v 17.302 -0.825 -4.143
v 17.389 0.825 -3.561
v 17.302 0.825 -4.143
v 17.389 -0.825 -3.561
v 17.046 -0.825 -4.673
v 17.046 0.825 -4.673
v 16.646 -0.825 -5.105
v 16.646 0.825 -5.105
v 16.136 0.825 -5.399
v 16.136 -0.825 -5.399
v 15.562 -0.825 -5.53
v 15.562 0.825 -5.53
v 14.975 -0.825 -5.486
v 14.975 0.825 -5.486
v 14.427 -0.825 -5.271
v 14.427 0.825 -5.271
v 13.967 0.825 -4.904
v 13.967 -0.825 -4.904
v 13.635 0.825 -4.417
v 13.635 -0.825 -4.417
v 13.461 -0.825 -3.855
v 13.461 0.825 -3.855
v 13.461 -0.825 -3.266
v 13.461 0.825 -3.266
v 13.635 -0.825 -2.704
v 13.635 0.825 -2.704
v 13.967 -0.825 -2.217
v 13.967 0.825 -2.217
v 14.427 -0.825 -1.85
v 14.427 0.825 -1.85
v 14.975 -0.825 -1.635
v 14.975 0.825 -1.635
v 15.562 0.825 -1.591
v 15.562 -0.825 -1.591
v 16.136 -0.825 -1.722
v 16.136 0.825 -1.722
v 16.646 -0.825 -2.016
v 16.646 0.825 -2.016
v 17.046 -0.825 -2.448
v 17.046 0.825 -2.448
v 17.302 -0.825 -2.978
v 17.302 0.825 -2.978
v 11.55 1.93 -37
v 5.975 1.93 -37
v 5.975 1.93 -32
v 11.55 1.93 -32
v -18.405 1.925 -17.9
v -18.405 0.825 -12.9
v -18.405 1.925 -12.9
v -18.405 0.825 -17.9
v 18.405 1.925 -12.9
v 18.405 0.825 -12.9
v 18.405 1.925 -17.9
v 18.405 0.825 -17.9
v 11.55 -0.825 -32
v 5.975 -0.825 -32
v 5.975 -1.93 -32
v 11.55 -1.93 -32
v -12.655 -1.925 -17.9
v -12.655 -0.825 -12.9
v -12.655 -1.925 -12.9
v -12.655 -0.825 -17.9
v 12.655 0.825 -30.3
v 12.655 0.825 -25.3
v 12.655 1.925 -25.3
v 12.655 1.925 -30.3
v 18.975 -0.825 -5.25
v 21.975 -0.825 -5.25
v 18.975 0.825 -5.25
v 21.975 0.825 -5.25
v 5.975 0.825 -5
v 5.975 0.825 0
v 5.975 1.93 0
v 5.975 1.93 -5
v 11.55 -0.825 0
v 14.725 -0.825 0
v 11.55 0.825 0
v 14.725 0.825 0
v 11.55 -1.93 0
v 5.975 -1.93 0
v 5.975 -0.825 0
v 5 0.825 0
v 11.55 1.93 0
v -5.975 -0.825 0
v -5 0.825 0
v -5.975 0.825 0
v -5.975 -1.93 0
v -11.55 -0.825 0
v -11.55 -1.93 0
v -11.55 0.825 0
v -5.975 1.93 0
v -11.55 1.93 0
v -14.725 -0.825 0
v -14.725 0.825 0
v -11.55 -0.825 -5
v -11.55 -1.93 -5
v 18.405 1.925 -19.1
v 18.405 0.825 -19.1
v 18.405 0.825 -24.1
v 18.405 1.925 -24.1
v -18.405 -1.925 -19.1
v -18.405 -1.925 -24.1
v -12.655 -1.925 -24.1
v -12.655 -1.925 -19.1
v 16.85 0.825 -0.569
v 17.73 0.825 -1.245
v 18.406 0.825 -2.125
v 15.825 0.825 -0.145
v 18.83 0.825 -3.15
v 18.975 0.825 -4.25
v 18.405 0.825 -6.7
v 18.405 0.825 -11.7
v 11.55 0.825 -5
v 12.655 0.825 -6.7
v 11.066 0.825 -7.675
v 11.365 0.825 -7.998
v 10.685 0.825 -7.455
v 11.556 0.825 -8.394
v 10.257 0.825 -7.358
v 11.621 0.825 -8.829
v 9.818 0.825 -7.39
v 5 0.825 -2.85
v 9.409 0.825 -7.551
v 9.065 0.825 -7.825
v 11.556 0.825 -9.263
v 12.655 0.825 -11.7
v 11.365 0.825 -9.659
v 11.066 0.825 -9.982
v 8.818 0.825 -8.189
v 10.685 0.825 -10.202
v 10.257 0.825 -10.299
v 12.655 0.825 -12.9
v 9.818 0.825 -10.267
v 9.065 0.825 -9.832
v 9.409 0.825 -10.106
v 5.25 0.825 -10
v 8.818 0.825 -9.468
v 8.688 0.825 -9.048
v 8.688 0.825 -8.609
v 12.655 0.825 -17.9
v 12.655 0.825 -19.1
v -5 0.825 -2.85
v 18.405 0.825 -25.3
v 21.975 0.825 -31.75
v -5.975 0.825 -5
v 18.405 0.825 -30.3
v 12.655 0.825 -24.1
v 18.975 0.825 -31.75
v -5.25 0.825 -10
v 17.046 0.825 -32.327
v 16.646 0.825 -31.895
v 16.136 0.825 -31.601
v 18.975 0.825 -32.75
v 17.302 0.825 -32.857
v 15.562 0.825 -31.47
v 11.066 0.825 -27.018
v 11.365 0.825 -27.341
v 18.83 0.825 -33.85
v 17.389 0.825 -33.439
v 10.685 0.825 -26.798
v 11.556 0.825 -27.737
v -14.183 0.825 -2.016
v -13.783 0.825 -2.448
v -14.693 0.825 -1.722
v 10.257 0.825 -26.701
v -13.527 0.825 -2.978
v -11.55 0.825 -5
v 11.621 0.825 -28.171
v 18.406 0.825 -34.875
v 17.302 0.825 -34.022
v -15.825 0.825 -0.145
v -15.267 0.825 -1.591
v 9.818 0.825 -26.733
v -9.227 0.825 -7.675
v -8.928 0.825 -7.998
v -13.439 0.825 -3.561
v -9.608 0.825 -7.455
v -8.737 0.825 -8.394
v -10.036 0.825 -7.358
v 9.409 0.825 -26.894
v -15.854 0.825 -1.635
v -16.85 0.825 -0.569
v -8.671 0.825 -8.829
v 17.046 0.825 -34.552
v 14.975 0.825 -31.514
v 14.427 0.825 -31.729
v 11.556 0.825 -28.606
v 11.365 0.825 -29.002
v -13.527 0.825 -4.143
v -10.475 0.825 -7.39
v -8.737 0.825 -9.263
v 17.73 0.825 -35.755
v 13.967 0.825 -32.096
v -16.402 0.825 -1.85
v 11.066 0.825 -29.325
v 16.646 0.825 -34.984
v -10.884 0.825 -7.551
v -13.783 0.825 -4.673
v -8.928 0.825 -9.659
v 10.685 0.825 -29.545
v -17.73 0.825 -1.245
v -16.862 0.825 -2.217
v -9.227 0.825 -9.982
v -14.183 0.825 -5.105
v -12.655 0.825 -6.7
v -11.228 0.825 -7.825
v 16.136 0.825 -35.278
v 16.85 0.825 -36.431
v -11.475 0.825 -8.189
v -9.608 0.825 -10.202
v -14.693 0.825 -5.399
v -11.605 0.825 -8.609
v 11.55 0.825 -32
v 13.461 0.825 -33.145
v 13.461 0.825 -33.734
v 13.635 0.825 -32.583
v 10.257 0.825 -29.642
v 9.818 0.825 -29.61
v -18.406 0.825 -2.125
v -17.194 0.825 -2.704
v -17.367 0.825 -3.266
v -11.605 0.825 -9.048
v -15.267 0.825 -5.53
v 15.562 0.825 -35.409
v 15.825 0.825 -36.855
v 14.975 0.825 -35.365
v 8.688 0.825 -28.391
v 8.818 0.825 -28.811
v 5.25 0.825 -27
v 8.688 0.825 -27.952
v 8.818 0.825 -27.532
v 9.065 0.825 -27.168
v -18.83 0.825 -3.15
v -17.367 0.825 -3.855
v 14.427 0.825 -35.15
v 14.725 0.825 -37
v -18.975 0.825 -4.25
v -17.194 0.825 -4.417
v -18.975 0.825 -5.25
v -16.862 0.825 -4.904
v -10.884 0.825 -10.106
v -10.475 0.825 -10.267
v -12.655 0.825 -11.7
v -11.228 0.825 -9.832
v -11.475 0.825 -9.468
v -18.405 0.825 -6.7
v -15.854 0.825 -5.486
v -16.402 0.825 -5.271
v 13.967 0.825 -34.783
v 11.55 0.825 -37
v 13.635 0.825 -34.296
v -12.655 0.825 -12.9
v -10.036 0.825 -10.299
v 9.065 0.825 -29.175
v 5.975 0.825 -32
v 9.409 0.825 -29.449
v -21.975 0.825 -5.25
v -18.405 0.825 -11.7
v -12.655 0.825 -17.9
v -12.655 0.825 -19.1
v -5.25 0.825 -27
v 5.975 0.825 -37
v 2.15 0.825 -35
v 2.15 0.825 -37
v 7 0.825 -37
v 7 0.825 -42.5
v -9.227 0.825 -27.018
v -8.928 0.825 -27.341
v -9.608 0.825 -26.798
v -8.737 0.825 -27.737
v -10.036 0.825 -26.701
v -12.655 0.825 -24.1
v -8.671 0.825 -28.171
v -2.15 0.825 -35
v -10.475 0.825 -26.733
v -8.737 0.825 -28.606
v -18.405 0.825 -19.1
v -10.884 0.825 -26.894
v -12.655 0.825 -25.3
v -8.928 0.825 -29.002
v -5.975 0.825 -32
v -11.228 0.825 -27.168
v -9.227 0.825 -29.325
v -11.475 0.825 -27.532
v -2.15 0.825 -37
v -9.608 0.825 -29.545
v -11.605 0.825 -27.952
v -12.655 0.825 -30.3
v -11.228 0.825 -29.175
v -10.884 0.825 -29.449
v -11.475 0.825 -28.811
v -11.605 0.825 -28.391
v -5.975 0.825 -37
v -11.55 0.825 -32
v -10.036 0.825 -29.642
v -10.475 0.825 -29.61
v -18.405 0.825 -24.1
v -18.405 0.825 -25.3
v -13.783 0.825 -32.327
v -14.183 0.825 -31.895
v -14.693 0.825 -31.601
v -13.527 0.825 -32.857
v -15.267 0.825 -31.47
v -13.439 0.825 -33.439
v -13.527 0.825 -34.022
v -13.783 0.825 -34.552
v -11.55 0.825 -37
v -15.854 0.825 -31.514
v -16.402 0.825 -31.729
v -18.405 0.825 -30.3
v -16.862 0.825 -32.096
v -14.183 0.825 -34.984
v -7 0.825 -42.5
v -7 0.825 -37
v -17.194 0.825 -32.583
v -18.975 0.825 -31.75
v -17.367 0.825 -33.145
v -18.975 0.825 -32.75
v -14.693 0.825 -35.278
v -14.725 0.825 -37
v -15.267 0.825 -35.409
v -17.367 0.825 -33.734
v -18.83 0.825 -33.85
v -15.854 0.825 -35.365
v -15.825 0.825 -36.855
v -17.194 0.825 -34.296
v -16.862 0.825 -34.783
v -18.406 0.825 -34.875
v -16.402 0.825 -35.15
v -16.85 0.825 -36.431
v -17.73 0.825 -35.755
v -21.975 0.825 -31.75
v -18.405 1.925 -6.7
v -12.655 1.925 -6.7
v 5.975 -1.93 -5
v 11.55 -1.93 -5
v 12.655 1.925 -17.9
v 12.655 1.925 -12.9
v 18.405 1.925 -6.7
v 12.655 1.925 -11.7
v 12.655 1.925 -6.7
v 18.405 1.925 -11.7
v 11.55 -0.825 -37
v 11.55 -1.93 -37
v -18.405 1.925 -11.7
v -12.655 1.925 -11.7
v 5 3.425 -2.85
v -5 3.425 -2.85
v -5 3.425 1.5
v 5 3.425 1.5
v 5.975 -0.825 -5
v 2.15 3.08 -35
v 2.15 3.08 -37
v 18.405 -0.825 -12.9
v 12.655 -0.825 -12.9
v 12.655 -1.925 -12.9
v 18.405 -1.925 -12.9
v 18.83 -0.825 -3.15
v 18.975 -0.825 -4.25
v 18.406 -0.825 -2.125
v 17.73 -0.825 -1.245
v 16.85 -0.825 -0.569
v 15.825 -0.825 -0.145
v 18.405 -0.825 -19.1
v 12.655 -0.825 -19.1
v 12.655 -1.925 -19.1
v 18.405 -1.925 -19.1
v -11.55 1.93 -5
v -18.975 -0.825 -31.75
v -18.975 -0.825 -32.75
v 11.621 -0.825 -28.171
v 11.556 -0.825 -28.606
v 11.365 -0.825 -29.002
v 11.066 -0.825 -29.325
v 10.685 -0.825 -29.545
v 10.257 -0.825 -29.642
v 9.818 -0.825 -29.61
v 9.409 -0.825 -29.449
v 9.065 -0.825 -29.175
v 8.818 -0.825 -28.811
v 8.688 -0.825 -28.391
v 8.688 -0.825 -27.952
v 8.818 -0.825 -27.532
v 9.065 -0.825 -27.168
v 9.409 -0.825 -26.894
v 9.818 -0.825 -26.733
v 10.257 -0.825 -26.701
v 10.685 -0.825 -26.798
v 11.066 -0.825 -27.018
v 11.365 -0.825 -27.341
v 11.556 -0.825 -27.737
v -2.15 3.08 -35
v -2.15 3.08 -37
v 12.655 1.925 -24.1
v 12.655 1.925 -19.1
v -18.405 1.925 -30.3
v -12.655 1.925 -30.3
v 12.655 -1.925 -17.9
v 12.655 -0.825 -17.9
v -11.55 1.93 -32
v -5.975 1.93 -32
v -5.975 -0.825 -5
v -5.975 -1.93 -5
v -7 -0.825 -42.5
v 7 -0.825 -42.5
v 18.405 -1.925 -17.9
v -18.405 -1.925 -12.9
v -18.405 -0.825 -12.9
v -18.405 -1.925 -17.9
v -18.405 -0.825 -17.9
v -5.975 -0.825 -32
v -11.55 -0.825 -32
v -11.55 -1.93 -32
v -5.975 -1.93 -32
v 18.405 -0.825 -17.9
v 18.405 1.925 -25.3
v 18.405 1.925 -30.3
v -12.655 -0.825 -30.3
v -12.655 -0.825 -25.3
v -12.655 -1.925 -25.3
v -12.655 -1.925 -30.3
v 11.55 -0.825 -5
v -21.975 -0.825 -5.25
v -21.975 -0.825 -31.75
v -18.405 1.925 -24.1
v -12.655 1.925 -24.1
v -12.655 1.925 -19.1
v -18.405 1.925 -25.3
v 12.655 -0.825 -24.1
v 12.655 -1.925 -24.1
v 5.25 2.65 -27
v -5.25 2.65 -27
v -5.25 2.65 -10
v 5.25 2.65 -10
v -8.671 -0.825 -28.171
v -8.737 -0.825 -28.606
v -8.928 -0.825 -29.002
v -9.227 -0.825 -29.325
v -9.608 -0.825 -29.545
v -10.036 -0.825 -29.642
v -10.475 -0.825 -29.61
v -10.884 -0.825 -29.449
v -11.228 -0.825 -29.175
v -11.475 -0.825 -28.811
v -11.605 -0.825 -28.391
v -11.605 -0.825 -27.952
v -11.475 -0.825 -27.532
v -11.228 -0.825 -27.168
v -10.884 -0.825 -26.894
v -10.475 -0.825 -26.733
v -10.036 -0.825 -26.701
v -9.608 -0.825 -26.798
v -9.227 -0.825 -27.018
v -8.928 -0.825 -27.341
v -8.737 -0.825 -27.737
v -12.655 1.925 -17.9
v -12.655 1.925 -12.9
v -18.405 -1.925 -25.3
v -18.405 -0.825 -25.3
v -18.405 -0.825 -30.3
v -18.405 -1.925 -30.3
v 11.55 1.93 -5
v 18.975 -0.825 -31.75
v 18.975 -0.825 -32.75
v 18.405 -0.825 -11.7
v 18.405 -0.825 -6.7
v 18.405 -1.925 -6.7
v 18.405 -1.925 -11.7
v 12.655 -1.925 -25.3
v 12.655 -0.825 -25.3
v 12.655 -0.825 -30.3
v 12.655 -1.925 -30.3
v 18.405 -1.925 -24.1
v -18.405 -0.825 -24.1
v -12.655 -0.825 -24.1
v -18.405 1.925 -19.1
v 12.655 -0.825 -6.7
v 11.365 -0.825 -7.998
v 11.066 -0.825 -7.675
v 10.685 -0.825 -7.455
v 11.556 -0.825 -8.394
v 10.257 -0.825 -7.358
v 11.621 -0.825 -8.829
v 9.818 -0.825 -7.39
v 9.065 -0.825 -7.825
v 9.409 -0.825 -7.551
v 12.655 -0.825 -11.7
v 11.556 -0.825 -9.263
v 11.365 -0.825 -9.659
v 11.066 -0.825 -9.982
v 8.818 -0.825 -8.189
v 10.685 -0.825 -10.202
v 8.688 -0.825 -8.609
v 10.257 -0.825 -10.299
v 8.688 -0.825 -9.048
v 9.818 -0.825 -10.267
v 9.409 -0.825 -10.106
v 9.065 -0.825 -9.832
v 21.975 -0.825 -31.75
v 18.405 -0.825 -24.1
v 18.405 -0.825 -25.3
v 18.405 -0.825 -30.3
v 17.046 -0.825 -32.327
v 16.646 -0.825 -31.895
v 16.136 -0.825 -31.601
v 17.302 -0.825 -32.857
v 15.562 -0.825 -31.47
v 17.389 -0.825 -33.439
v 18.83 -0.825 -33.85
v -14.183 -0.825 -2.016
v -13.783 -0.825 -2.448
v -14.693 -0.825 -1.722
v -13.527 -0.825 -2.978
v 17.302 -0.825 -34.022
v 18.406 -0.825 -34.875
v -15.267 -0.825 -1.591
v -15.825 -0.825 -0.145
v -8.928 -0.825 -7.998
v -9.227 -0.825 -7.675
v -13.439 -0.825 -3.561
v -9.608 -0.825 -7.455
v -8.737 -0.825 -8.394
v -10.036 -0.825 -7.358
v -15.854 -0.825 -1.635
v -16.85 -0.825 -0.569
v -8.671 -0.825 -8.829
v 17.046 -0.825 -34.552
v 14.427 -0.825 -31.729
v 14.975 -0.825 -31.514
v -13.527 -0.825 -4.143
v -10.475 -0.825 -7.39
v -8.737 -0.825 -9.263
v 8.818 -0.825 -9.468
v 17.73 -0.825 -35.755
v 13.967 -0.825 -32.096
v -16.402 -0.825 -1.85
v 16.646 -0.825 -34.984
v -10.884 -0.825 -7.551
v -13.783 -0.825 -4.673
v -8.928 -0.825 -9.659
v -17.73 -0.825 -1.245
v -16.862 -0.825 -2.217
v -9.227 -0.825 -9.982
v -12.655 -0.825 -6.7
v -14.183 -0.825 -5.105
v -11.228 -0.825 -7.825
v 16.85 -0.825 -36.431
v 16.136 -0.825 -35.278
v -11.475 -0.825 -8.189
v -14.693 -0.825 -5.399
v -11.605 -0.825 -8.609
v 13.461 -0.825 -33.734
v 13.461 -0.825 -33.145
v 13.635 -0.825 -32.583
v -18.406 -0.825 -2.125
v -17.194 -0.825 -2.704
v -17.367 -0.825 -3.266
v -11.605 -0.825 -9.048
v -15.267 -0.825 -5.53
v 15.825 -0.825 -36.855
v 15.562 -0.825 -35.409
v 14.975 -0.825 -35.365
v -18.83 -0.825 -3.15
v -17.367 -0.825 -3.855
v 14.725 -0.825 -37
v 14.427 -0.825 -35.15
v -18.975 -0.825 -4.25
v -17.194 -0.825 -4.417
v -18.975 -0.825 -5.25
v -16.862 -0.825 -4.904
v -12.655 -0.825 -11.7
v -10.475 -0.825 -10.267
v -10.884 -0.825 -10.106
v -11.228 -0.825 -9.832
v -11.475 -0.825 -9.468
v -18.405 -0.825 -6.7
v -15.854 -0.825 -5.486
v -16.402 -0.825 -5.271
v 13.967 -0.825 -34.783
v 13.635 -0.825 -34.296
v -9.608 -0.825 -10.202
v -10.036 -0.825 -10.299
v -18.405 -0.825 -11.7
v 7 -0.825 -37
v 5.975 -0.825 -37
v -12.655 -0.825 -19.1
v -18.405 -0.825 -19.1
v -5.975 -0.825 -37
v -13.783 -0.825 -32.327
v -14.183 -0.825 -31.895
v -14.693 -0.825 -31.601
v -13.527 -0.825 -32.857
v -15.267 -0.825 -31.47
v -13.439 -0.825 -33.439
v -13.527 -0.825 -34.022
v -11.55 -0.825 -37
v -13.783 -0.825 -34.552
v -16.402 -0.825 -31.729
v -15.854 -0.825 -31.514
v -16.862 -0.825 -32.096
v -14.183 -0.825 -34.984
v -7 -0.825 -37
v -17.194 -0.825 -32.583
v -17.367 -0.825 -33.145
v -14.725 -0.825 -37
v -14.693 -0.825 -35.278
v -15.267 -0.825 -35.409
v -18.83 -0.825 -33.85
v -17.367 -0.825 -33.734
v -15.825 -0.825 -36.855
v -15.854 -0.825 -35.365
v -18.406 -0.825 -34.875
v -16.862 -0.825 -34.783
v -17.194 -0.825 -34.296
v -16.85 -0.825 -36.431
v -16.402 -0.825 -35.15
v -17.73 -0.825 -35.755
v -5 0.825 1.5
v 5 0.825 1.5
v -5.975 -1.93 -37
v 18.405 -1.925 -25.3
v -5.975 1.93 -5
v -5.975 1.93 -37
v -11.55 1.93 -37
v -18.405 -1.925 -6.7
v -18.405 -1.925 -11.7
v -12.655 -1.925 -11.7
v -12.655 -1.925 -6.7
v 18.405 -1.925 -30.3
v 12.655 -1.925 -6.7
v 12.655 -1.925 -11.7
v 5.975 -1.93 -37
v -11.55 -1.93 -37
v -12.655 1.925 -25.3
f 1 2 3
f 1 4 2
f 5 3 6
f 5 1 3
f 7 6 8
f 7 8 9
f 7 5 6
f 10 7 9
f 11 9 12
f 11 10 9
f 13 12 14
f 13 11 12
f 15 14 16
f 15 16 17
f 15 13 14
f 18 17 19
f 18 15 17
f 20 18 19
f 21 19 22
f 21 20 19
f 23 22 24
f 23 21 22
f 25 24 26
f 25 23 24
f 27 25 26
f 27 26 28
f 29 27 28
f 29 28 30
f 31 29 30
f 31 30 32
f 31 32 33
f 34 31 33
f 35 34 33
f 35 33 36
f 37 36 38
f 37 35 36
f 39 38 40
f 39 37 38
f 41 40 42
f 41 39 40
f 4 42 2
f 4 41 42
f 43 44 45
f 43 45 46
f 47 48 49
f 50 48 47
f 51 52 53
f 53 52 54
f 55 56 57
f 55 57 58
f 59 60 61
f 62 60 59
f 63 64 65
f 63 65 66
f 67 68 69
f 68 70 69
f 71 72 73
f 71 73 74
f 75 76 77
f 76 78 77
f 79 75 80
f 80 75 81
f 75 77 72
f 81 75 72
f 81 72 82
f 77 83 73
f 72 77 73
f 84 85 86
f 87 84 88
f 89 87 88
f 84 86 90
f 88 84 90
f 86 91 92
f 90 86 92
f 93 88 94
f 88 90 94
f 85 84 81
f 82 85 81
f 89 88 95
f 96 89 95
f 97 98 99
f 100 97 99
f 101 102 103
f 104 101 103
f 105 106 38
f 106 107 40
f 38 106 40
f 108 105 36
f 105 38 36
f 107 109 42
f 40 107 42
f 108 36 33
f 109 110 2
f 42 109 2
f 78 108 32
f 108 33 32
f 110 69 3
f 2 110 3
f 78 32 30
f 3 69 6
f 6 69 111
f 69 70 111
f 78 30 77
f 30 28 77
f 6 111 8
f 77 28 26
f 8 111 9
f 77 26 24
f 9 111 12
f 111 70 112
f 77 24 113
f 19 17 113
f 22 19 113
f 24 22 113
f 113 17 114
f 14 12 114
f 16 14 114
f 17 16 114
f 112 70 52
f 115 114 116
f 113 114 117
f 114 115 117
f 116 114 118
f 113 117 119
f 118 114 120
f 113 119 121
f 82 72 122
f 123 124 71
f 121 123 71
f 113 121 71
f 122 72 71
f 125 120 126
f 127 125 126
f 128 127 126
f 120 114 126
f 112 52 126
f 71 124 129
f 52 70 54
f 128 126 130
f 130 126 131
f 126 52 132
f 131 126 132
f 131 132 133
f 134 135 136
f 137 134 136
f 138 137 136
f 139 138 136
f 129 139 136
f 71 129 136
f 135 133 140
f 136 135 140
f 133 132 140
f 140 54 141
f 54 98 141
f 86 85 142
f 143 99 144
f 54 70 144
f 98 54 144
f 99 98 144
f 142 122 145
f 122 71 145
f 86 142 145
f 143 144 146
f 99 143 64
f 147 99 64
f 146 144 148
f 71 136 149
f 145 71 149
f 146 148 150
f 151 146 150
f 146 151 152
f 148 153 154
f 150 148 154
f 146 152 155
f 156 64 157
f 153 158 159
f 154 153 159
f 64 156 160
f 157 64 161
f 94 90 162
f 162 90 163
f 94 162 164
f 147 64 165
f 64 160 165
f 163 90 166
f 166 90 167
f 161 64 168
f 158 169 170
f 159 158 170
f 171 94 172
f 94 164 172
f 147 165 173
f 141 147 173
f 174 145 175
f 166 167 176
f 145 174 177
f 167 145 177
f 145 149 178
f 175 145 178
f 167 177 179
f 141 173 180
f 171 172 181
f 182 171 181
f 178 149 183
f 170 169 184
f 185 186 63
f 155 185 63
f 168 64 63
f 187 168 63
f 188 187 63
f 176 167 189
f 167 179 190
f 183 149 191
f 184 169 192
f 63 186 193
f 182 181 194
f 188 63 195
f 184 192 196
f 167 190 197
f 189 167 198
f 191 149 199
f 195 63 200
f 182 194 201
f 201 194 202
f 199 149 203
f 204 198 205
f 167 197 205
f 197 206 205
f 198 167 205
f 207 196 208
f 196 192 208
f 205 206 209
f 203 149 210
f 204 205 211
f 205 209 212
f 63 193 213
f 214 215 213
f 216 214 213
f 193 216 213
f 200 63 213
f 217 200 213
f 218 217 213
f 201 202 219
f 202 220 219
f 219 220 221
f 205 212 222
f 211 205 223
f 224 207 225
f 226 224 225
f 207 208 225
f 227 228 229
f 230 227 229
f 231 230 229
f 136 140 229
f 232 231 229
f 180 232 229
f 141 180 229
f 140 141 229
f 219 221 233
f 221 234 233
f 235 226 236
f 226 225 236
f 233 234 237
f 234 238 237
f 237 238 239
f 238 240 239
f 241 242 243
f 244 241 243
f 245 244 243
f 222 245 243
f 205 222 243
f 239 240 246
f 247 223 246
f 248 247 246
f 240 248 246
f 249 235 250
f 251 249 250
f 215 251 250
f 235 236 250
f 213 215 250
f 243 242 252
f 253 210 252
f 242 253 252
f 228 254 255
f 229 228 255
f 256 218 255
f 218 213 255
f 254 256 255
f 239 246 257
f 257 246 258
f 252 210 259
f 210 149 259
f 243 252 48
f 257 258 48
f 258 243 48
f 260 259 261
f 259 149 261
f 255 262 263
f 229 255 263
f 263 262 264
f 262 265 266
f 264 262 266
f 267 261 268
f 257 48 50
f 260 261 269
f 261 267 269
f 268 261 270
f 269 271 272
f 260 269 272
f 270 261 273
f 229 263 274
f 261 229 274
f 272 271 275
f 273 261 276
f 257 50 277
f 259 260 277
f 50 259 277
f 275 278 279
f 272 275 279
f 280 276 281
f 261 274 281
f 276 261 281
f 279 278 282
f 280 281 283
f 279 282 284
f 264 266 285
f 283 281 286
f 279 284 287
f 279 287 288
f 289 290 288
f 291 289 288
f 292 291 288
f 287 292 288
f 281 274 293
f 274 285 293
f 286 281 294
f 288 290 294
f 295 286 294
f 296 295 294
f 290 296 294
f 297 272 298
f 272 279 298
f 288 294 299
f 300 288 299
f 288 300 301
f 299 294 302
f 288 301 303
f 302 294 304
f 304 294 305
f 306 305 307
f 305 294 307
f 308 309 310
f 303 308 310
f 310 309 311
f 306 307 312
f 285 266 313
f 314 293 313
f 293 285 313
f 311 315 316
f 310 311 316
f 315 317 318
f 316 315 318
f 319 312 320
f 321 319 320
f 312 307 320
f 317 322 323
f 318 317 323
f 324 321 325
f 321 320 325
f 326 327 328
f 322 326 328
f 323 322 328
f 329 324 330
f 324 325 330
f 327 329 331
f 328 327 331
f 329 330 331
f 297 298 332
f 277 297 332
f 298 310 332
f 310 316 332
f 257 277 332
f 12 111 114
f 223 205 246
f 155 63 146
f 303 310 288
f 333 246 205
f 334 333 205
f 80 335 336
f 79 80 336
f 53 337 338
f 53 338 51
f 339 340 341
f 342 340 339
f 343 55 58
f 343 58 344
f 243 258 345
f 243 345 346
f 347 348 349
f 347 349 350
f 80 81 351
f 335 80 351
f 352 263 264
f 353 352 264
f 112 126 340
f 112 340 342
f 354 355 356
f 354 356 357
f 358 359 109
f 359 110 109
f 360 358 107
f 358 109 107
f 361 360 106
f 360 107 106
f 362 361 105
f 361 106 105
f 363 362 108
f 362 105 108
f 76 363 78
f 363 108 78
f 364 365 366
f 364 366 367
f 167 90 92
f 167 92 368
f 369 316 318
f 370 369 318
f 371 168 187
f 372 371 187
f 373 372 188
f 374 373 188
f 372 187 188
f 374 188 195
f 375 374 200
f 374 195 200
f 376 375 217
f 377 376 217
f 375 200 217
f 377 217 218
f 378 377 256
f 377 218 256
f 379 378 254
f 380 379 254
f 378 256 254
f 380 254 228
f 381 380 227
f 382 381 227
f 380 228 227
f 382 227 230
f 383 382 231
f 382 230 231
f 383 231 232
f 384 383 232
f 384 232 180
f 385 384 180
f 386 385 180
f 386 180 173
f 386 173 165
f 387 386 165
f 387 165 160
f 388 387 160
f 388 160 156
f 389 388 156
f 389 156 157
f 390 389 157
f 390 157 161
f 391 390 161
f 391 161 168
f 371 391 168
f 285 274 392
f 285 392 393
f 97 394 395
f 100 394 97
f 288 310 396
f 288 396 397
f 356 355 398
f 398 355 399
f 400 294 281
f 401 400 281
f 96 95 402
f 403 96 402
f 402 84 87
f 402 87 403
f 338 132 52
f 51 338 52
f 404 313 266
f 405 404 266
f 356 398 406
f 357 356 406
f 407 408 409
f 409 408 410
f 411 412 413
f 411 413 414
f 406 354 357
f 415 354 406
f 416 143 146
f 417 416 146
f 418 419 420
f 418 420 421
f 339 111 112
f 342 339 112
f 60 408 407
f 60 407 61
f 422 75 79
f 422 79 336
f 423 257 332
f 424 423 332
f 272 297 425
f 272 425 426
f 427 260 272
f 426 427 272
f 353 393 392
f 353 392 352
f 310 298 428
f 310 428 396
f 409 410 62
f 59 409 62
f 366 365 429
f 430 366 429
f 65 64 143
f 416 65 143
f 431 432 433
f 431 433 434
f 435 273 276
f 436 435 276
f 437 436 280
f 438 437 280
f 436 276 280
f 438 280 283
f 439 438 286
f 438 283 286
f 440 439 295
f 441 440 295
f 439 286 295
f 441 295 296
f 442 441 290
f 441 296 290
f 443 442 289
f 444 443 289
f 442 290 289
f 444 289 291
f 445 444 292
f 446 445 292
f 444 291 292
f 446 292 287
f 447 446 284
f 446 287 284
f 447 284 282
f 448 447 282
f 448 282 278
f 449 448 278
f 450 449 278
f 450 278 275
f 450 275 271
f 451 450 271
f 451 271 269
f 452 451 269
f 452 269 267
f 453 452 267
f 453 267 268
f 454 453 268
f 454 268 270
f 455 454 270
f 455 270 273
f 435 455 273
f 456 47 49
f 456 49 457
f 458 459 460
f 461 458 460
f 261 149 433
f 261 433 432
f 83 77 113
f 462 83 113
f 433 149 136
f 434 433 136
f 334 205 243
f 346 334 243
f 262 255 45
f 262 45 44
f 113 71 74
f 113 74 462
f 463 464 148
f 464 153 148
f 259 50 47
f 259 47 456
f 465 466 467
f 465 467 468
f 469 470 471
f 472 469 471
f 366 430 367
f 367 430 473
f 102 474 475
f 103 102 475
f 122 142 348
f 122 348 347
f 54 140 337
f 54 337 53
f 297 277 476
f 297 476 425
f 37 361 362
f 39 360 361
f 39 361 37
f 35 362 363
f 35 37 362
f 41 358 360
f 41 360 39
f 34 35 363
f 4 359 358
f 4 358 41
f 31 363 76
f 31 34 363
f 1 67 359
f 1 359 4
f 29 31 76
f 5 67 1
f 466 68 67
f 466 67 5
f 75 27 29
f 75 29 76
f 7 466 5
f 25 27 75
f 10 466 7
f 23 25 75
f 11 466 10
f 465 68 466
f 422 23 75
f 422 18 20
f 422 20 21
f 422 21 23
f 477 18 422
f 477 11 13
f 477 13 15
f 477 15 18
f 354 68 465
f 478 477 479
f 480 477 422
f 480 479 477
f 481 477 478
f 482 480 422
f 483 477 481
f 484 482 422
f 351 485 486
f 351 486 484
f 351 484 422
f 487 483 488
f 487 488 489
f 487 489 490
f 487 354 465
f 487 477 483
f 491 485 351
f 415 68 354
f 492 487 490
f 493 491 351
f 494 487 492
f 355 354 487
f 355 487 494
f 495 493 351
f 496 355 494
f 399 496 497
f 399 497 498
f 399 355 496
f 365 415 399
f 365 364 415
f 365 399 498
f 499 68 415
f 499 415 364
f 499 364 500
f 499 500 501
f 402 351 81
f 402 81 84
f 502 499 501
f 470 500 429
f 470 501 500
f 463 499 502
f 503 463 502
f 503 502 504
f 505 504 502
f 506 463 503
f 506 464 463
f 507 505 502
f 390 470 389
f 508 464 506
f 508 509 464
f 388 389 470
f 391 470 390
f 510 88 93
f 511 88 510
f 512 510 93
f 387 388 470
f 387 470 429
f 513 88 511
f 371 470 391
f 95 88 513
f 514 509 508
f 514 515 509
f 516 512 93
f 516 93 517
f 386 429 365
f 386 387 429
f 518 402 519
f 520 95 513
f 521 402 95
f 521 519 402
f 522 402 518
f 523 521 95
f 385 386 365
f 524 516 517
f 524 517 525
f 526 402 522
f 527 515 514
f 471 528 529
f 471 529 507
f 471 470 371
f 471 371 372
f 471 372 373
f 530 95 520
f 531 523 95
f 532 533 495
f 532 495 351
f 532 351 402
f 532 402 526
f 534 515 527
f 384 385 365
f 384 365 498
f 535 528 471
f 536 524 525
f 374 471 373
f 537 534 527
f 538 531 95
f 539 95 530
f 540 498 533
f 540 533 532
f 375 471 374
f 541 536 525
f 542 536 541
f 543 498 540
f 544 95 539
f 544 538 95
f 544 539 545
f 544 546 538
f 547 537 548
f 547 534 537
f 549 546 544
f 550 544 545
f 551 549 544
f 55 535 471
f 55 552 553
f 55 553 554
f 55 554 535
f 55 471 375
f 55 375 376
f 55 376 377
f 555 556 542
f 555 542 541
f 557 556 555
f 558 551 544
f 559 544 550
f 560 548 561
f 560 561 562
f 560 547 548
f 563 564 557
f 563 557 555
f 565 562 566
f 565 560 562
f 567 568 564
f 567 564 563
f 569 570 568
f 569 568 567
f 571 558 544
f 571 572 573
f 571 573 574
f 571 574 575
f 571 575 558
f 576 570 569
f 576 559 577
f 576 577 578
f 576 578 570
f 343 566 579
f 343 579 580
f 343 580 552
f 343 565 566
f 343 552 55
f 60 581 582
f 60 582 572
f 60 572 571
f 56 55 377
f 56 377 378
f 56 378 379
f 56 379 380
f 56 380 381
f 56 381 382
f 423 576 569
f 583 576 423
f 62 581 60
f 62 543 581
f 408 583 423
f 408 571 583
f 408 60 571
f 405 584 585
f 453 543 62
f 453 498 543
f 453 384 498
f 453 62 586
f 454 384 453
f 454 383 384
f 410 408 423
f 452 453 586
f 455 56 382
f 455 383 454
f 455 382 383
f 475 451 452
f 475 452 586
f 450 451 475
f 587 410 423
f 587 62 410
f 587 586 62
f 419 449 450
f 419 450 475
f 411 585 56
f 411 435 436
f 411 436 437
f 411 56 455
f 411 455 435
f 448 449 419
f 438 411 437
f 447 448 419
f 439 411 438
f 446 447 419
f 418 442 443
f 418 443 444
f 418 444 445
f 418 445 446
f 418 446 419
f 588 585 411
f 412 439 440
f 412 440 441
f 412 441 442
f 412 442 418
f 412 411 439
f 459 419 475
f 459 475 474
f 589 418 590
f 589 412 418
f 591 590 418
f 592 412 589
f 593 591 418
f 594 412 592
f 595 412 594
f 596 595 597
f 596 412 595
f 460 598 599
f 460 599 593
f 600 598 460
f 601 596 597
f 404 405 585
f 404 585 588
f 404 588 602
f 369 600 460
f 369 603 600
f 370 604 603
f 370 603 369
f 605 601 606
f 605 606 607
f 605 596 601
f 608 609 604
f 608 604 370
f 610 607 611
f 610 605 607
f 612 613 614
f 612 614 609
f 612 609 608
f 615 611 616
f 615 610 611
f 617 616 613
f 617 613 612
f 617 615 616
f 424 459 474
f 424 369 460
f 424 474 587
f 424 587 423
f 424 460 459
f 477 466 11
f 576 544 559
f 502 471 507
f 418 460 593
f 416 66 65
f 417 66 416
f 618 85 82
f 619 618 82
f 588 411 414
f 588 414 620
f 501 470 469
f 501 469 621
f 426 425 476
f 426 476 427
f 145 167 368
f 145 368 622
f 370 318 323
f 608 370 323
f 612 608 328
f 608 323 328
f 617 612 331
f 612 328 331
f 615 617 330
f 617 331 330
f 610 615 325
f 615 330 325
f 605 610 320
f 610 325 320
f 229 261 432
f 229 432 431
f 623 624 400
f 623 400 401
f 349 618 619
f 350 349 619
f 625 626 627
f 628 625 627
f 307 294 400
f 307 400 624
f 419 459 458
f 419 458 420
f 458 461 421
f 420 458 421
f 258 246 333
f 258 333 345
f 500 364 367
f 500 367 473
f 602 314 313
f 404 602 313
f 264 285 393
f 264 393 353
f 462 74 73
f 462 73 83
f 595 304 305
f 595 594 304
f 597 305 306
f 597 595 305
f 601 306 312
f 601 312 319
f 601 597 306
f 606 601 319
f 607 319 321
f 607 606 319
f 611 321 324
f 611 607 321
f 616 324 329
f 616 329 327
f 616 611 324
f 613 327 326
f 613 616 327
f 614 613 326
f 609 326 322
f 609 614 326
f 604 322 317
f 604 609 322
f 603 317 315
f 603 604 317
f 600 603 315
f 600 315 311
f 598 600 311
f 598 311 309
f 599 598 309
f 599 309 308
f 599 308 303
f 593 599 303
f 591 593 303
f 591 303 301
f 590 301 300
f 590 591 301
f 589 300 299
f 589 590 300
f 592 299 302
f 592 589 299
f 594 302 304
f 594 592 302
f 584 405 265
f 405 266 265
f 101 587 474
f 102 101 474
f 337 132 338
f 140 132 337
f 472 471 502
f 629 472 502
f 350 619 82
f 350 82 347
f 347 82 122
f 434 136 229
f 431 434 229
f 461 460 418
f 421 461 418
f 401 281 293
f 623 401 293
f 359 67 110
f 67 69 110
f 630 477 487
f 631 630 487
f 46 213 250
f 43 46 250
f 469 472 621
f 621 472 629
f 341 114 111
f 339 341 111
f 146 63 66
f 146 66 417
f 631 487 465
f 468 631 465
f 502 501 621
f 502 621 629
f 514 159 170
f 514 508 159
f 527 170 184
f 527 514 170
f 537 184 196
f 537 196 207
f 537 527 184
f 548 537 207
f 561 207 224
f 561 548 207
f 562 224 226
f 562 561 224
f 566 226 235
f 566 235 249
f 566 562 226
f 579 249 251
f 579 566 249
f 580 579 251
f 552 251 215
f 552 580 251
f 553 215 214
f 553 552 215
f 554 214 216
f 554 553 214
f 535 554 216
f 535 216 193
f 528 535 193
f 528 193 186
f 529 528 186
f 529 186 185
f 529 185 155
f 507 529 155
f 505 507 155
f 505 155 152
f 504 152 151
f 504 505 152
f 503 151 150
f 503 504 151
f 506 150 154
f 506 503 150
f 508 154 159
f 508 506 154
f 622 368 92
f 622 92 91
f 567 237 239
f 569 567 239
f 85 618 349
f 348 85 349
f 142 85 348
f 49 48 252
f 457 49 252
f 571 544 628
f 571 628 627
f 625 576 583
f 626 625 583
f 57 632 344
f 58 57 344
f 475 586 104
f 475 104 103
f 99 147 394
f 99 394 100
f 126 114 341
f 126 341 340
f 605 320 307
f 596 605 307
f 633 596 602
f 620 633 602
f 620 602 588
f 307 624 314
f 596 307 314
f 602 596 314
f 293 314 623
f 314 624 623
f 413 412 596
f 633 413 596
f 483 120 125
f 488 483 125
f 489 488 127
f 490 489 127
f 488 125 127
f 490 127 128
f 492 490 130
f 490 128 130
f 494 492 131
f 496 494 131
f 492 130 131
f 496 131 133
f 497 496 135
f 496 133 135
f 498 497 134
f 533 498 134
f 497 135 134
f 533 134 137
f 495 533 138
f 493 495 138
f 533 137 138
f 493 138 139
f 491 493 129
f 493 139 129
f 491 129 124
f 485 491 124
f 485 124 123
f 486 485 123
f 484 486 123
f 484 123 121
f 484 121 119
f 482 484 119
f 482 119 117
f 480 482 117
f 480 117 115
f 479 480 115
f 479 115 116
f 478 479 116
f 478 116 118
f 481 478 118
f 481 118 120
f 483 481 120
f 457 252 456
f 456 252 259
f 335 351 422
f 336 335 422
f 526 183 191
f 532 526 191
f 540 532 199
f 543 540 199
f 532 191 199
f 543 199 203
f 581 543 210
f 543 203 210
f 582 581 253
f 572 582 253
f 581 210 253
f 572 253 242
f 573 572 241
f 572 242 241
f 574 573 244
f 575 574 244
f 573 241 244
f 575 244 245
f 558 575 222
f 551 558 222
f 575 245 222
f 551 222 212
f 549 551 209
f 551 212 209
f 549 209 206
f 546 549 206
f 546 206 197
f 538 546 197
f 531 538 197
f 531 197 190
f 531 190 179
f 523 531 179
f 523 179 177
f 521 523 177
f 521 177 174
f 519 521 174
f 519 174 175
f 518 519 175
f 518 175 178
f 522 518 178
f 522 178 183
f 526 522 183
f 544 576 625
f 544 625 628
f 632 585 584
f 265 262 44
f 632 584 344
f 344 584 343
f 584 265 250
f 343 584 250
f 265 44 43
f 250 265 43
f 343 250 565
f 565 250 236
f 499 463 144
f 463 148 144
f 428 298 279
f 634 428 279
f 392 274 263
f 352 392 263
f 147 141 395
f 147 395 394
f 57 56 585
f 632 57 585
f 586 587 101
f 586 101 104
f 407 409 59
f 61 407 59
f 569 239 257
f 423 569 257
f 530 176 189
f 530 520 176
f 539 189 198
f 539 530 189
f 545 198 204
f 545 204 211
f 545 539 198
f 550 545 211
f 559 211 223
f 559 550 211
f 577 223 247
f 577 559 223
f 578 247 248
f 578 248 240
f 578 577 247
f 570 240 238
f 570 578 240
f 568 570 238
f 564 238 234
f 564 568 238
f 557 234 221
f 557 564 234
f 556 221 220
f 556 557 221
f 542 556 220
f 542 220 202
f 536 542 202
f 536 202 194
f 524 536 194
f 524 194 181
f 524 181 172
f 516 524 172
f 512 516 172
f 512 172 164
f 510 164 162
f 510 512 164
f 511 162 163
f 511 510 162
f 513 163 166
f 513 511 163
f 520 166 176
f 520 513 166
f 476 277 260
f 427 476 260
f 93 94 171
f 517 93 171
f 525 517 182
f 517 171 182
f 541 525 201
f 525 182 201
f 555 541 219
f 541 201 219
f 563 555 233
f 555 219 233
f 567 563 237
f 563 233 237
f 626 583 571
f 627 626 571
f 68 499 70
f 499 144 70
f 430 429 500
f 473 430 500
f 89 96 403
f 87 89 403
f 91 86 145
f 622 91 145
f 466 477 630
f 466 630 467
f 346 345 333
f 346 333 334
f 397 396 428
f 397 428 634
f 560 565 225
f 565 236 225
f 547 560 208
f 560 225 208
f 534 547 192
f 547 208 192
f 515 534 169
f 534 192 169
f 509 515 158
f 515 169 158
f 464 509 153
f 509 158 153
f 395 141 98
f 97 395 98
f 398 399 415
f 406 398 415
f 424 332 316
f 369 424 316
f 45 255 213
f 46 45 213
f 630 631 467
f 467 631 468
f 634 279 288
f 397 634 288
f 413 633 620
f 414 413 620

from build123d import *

# Parameters (mm, degrees)
SKETCH1_R                       = 1.975
PCB_DEPTH                       = 0.825
SKETCH7_R                       = 1.475
INNER_HOLES_DEPTH               = 1
INNER_HOLES_DEPTH_BACK          = 2.65
SKETCH8_W                       = 10
SKETCH8_H                       = 4.35
CONNECTOR_DEPTH                 = 2.6
SKETCH9_W                       = 4.3
SKETCH9_H                       = 2
TOP_COMPONENT_DEPTH             = 2.255
SKETCH10_W                      = 5.75
SKETCH10_H                      = 5
SIDE_COMPONENTS_DEPTH           = 1.1
SKETCH11_W                      = 10.5
SKETCH11_H                      = 17
CENTRAL_COMPONENTS_DEPTH        = 1.825
SKETCH12_W                      = 5.575
SKETCH12_H                      = 5
TOP_AND_BOTTOM_COMPONENTS_DEPTH = 1.105


with BuildPart() as part:
    # Sketch1 → PCB (new body, symmetric)
    with BuildSketch(Plane(origin=(0, 0, 0), x_dir=(1, 0, 0), z_dir=(0, 1, 0))):
        with BuildLine():
            Line((-7, 42.5), (7, 42.5))
            Line((7, 42.5), (7, 37))
            Line((7, 37), (14.725, 37))
            ThreePointArc((14.725, 37), (17.73020382, 35.75520382), (18.975, 32.75))
            Line((18.975, 32.75), (18.975, 31.75))
            Line((18.975, 31.75), (21.975, 31.75))
            Line((21.975, 31.75), (21.975, 5.25))
            Line((21.975, 5.25), (18.975, 5.25))
            Line((18.975, 5.25), (18.975, 4.25))
            ThreePointArc((18.975, 4.25), (17.73020382, 1.24479618), (14.725, 0))
            Line((14.725, 0), (-14.725, 0))
            ThreePointArc((-14.725, 0), (-17.73020382, 1.24479618), (-18.975, 4.25))
            Line((-18.975, 4.25), (-18.975, 5.25))
            Line((-18.975, 5.25), (-21.975, 5.25))
            Line((-21.975, 5.25), (-21.975, 31.75))
            Line((-21.975, 31.75), (-18.975, 31.75))
            Line((-18.975, 31.75), (-18.975, 32.75))
            ThreePointArc((-18.975, 32.75), (-17.73020382, 35.75520382), (-14.725, 37))
            Line((-14.725, 37), (-7, 37))
            Line((-7, 37), (-7, 42.5))
        make_face()
        with Locations((15.414429112, 33.439429112)):
            Circle(SKETCH1_R, mode=Mode.SUBTRACT)
        with Locations((15.414429112, 3.560570888)):
            Circle(SKETCH1_R, mode=Mode.SUBTRACT)
        with Locations((-15.414429112, 3.560570888)):
            Circle(SKETCH1_R, mode=Mode.SUBTRACT)
        with Locations((-15.414429112, 33.439429112)):
            Circle(SKETCH1_R, mode=Mode.SUBTRACT)
    extrude(amount=PCB_DEPTH, both=True)

    # Sketch7 → inner holes (cut, two sides)
    with BuildSketch(Plane(origin=(0, 0.825, 0), x_dir=(1, 0, 0), z_dir=(0, 1, 0))) as inner_holes_sk:
        with Locations((10.146483592, 28.171483592)):
            Circle(SKETCH7_R)
        with Locations((-10.146483592, 28.171483592)):
            Circle(SKETCH7_R)
        with Locations((-10.146483592, 8.828516408)):
            Circle(SKETCH7_R)
        with Locations((10.146483592, 8.828516408)):
            Circle(SKETCH7_R)
    extrude(amount=INNER_HOLES_DEPTH, mode=Mode.SUBTRACT)
    extrude(inner_holes_sk.sketch, amount=-INNER_HOLES_DEPTH_BACK, mode=Mode.SUBTRACT)

    # Sketch8 → Connector (add)
    with BuildSketch(Plane(origin=(0, 0.825, 0), x_dir=(1, 0, 0), z_dir=(0, 1, 0))):
        with Locations((0, 0.675)):
            Rectangle(SKETCH8_W, SKETCH8_H)
    extrude(amount=CONNECTOR_DEPTH)

    # Sketch9 → Top component (add)
    with BuildSketch(Plane(origin=(0, 0.825, 0), x_dir=(1, 0, 0), z_dir=(0, 1, 0))):
        with Locations((0, 36)):
            Rectangle(SKETCH9_W, SKETCH9_H)
    extrude(amount=TOP_COMPONENT_DEPTH)

    # Sketch10 → Side Components (add)
    with BuildSketch(Plane(origin=(0, 0.825, 0), x_dir=(1, 0, 0), z_dir=(0, 1, 0))):
        with Locations((15.53, 15.4)):
            Rectangle(SKETCH10_W, SKETCH10_H)
        with Locations((15.53, 9.2)):
            Rectangle(SKETCH10_W, SKETCH10_H)
        with Locations((15.53, 21.6)):
            Rectangle(SKETCH10_W, SKETCH10_H)
        with Locations((15.53, 27.8)):
            Rectangle(SKETCH10_W, SKETCH10_H)
        with Locations((-15.53, 9.2)):
            Rectangle(SKETCH10_W, SKETCH10_H)
        with Locations((-15.53, 15.4)):
            Rectangle(SKETCH10_W, SKETCH10_H)
        with Locations((-15.53, 21.6)):
            Rectangle(SKETCH10_W, SKETCH10_H)
        with Locations((-15.53, 27.8)):
            Rectangle(SKETCH10_W, SKETCH10_H)
    side_components = extrude(amount=SIDE_COMPONENTS_DEPTH)

    # Sketch11 → Central components (add)
    with BuildSketch(Plane(origin=(0, 0.825, 0), x_dir=(1, 0, 0), z_dir=(0, 1, 0))):
        with Locations((0, 18.5)):
            Rectangle(SKETCH11_W, SKETCH11_H)
    extrude(amount=CENTRAL_COMPONENTS_DEPTH)

    # Sketch12 → Top and bottom components (add)
    with BuildSketch(Plane(origin=(0, 0.825, 0), x_dir=(1, 0, 0), z_dir=(0, 1, 0))):
        with Locations((8.7625, 34.5)):
            Rectangle(SKETCH12_W, SKETCH12_H)
        with Locations((8.7625, 2.5)):
            Rectangle(SKETCH12_W, SKETCH12_H)
        with Locations((-8.7625, 2.5)):
            Rectangle(SKETCH12_W, SKETCH12_H)
        with Locations((-8.7625, 34.5)):
            Rectangle(SKETCH12_W, SKETCH12_H)
    top_and_bottom_components = extrude(amount=TOP_AND_BOTTOM_COMPONENTS_DEPTH)

    # Mirror2: Side Components, Top and bottom components across plane
    add(side_components.mirror(Plane.ZX))
    add(top_and_bottom_components.mirror(Plane.ZX))


solid = part.part
